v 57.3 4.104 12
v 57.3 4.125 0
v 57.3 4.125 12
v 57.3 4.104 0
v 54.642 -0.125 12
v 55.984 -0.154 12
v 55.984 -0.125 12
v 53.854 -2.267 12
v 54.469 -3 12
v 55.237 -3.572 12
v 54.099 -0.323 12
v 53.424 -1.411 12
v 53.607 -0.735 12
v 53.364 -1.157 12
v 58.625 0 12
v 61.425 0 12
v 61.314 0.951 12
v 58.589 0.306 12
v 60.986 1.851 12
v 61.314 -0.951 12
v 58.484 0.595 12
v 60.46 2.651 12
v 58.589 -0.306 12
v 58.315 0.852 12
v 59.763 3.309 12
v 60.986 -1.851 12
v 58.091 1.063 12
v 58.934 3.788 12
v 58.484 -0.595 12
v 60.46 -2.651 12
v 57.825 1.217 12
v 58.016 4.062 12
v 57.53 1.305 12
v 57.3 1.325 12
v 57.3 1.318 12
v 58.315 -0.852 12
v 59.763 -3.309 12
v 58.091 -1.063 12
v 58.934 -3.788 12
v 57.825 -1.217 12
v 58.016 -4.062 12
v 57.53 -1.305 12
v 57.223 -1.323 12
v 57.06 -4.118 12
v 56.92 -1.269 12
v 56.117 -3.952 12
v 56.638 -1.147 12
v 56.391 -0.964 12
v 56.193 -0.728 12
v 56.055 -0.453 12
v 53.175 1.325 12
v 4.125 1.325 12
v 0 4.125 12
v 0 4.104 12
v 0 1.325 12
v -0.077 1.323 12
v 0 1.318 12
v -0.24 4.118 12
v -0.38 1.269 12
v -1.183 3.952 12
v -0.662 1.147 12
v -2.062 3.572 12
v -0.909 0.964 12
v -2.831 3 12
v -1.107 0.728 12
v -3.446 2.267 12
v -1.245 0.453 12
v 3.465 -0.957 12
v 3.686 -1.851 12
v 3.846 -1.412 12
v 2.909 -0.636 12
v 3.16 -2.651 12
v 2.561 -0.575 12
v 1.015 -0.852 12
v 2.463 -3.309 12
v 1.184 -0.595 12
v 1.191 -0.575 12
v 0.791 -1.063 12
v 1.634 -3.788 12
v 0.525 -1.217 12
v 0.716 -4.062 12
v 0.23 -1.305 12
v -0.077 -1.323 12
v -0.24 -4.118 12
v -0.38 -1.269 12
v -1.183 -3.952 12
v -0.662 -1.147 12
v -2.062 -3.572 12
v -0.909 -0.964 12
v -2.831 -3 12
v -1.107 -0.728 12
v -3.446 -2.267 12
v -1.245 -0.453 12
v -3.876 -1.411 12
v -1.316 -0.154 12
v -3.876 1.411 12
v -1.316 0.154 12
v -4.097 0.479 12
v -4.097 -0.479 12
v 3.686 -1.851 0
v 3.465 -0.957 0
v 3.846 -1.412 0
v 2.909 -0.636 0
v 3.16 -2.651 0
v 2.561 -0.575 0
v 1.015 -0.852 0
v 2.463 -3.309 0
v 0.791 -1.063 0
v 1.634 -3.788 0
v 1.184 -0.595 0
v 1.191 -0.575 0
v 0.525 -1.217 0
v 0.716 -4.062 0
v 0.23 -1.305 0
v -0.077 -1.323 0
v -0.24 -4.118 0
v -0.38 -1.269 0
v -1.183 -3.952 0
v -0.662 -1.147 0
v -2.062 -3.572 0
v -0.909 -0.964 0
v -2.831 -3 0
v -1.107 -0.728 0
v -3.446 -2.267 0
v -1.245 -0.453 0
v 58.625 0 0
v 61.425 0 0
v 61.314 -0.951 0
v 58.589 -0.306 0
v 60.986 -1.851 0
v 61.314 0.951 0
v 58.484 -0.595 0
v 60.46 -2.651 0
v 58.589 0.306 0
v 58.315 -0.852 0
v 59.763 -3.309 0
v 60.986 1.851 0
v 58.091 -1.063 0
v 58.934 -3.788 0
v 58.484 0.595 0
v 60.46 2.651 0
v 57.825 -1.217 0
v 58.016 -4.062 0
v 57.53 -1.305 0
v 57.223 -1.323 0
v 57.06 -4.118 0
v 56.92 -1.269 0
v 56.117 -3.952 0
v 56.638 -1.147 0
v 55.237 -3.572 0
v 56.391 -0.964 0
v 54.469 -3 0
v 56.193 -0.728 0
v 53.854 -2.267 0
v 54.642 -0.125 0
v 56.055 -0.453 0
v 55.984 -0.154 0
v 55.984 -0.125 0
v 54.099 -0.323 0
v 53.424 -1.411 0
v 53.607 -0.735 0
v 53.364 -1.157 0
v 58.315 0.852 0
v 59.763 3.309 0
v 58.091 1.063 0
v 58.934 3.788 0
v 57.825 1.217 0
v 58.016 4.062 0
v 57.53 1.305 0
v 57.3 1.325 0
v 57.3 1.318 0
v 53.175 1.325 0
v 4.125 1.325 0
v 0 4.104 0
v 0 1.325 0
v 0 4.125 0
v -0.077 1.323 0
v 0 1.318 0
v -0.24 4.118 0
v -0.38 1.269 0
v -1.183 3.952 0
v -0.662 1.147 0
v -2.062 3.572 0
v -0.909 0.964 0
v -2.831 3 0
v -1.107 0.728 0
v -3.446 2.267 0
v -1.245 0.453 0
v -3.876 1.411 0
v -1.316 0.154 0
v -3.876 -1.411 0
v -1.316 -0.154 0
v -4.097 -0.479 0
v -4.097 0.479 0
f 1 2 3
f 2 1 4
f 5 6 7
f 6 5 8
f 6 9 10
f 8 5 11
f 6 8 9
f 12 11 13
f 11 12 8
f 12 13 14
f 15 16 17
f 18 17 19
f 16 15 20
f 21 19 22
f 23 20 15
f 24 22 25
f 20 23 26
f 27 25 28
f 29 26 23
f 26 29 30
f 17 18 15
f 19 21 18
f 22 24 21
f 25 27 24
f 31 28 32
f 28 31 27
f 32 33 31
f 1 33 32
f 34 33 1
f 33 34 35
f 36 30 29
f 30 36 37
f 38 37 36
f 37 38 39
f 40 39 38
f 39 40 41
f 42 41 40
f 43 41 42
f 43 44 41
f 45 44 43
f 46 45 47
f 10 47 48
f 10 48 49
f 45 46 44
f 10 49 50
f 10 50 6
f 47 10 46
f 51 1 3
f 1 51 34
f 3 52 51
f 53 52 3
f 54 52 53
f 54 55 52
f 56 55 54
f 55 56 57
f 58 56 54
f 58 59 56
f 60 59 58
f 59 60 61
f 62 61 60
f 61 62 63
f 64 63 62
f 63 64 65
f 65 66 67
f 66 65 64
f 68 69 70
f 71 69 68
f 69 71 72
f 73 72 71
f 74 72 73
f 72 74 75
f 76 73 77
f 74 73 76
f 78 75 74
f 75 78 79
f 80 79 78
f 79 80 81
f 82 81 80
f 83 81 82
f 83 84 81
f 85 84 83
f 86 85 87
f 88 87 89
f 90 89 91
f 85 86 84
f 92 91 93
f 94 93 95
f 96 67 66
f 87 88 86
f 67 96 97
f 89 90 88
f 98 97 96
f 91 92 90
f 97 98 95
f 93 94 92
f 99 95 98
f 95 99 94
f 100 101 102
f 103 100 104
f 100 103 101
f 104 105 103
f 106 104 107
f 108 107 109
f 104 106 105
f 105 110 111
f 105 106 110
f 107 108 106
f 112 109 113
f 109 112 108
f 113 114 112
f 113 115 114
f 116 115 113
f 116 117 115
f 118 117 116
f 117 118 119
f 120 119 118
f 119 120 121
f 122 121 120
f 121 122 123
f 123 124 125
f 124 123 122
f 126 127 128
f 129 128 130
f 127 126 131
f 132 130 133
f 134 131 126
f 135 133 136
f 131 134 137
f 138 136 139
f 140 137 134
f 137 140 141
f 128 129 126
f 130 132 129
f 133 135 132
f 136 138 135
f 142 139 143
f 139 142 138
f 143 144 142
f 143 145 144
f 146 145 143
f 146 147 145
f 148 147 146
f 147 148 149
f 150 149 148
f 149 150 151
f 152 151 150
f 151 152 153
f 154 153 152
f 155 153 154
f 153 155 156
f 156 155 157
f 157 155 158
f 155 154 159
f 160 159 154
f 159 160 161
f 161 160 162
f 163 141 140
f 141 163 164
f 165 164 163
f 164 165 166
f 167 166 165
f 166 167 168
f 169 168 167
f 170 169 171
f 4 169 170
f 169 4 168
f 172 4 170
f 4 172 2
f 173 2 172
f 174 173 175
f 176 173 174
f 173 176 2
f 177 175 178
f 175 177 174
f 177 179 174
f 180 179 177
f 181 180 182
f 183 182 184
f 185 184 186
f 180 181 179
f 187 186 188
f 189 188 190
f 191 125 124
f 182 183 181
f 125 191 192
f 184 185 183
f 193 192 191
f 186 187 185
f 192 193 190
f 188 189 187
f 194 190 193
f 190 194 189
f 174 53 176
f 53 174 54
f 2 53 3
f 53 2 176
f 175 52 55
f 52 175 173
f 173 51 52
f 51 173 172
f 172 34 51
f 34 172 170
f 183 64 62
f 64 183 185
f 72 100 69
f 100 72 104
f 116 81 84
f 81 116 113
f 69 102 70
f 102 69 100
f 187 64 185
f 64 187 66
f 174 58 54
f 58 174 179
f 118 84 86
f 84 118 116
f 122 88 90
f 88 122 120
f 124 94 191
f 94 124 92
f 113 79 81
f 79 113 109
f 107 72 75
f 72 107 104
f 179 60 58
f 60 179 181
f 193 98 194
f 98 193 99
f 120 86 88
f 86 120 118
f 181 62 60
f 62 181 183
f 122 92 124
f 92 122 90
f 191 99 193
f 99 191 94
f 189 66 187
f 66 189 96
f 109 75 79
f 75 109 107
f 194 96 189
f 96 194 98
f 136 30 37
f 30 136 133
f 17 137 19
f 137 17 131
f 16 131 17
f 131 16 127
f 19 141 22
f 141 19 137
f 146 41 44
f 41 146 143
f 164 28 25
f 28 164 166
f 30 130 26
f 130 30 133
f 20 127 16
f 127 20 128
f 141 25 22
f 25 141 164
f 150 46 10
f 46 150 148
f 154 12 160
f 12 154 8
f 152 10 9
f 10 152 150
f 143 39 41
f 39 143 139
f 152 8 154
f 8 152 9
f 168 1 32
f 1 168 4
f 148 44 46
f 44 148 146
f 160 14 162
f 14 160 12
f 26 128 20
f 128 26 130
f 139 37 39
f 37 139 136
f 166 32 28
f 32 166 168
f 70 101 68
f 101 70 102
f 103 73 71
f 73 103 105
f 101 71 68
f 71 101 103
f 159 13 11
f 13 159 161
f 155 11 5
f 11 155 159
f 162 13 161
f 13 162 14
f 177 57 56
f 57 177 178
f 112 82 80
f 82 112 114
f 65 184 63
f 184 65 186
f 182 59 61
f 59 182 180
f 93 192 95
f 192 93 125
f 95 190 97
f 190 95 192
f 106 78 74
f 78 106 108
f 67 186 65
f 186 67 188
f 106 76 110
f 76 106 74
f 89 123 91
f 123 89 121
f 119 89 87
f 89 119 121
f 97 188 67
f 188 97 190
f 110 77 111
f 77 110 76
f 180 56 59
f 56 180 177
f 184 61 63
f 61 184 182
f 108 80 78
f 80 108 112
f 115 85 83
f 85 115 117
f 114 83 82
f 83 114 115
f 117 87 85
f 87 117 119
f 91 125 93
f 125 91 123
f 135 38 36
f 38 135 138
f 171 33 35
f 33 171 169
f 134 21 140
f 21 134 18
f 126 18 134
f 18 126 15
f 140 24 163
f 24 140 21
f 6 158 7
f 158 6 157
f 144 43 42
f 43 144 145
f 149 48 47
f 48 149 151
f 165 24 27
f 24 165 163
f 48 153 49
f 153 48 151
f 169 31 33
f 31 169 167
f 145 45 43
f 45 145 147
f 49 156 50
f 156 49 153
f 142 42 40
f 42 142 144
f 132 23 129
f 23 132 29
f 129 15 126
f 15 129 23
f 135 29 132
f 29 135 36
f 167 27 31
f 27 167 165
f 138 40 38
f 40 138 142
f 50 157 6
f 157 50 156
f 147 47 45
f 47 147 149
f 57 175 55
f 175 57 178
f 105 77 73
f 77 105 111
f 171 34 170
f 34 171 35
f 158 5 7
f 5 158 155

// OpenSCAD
// Distance between wires (perimeter-to-perimeter) in folded position
length = 60;
// Clip overall thickness (choose based on extrusion width; mine is 0.42 and with 2.8 Slic3r produces exactly 3+3 walls total thickness with no infill)
thickness = 2.8;

/* [Wire] */
// Diameter of wire
diameter = 2.7;
// Clip lip vertical thickness (larger makes clip harder to insert/remove; must be smaller than wire diameter, recommended setting just under diameter/4)
first_lip = 0.75;
// Clip lip vertical thickness (larger makes clip harder to insert/remove; must be smaller than wire diameter, recommended setting just under diameter/2)
second_lip = 1.2;

/* [Hidden] */

ir = (diameter - .05)/2;
thk = thickness;
l = length - diameter;
w = 12;

slack1 = first_lip;
slack2 = second_lip;

$fn = 27;

module fillet(h, r) {
  difference() {
    cube([h, r, r]);
    translate([-0.1, r, r]) rotate([0, 90, 0]) cylinder(h = h+.2, r = r, $fn=18);
  }
}

module main() {
  difference() {
    union() {
      translate([0, ir, 0]) cube([l, thk, w]);
      cylinder(r=ir+thk, h=w);
      translate([l, 0, 0]) cylinder(r=ir+thk, h=w);
    }
    translate([0, 0, -1]) cylinder(r=ir, h=w+2);
    translate([l, 0, -1]) cylinder(r=ir, h=w+2);
    translate([0, -ir+slack1, -1]) cube([ir+thk, 2*ir-slack1, w+2]);
    translate([l-ir-thk, -ir+slack2, -1]) cube([ir+thk, 2*ir-slack2, w+2]);
    translate([ir+thk, -ir+slack1+0.05, -1]) rotate([0, -90, 90]) fillet(r=0.66*thk, h=w+2);
    translate([l-ir-thk, -ir+slack2+0.05, -1]) rotate([0, -90, 180]) fillet(r=0.66*thk, h=w+2);
  }
}

main();
